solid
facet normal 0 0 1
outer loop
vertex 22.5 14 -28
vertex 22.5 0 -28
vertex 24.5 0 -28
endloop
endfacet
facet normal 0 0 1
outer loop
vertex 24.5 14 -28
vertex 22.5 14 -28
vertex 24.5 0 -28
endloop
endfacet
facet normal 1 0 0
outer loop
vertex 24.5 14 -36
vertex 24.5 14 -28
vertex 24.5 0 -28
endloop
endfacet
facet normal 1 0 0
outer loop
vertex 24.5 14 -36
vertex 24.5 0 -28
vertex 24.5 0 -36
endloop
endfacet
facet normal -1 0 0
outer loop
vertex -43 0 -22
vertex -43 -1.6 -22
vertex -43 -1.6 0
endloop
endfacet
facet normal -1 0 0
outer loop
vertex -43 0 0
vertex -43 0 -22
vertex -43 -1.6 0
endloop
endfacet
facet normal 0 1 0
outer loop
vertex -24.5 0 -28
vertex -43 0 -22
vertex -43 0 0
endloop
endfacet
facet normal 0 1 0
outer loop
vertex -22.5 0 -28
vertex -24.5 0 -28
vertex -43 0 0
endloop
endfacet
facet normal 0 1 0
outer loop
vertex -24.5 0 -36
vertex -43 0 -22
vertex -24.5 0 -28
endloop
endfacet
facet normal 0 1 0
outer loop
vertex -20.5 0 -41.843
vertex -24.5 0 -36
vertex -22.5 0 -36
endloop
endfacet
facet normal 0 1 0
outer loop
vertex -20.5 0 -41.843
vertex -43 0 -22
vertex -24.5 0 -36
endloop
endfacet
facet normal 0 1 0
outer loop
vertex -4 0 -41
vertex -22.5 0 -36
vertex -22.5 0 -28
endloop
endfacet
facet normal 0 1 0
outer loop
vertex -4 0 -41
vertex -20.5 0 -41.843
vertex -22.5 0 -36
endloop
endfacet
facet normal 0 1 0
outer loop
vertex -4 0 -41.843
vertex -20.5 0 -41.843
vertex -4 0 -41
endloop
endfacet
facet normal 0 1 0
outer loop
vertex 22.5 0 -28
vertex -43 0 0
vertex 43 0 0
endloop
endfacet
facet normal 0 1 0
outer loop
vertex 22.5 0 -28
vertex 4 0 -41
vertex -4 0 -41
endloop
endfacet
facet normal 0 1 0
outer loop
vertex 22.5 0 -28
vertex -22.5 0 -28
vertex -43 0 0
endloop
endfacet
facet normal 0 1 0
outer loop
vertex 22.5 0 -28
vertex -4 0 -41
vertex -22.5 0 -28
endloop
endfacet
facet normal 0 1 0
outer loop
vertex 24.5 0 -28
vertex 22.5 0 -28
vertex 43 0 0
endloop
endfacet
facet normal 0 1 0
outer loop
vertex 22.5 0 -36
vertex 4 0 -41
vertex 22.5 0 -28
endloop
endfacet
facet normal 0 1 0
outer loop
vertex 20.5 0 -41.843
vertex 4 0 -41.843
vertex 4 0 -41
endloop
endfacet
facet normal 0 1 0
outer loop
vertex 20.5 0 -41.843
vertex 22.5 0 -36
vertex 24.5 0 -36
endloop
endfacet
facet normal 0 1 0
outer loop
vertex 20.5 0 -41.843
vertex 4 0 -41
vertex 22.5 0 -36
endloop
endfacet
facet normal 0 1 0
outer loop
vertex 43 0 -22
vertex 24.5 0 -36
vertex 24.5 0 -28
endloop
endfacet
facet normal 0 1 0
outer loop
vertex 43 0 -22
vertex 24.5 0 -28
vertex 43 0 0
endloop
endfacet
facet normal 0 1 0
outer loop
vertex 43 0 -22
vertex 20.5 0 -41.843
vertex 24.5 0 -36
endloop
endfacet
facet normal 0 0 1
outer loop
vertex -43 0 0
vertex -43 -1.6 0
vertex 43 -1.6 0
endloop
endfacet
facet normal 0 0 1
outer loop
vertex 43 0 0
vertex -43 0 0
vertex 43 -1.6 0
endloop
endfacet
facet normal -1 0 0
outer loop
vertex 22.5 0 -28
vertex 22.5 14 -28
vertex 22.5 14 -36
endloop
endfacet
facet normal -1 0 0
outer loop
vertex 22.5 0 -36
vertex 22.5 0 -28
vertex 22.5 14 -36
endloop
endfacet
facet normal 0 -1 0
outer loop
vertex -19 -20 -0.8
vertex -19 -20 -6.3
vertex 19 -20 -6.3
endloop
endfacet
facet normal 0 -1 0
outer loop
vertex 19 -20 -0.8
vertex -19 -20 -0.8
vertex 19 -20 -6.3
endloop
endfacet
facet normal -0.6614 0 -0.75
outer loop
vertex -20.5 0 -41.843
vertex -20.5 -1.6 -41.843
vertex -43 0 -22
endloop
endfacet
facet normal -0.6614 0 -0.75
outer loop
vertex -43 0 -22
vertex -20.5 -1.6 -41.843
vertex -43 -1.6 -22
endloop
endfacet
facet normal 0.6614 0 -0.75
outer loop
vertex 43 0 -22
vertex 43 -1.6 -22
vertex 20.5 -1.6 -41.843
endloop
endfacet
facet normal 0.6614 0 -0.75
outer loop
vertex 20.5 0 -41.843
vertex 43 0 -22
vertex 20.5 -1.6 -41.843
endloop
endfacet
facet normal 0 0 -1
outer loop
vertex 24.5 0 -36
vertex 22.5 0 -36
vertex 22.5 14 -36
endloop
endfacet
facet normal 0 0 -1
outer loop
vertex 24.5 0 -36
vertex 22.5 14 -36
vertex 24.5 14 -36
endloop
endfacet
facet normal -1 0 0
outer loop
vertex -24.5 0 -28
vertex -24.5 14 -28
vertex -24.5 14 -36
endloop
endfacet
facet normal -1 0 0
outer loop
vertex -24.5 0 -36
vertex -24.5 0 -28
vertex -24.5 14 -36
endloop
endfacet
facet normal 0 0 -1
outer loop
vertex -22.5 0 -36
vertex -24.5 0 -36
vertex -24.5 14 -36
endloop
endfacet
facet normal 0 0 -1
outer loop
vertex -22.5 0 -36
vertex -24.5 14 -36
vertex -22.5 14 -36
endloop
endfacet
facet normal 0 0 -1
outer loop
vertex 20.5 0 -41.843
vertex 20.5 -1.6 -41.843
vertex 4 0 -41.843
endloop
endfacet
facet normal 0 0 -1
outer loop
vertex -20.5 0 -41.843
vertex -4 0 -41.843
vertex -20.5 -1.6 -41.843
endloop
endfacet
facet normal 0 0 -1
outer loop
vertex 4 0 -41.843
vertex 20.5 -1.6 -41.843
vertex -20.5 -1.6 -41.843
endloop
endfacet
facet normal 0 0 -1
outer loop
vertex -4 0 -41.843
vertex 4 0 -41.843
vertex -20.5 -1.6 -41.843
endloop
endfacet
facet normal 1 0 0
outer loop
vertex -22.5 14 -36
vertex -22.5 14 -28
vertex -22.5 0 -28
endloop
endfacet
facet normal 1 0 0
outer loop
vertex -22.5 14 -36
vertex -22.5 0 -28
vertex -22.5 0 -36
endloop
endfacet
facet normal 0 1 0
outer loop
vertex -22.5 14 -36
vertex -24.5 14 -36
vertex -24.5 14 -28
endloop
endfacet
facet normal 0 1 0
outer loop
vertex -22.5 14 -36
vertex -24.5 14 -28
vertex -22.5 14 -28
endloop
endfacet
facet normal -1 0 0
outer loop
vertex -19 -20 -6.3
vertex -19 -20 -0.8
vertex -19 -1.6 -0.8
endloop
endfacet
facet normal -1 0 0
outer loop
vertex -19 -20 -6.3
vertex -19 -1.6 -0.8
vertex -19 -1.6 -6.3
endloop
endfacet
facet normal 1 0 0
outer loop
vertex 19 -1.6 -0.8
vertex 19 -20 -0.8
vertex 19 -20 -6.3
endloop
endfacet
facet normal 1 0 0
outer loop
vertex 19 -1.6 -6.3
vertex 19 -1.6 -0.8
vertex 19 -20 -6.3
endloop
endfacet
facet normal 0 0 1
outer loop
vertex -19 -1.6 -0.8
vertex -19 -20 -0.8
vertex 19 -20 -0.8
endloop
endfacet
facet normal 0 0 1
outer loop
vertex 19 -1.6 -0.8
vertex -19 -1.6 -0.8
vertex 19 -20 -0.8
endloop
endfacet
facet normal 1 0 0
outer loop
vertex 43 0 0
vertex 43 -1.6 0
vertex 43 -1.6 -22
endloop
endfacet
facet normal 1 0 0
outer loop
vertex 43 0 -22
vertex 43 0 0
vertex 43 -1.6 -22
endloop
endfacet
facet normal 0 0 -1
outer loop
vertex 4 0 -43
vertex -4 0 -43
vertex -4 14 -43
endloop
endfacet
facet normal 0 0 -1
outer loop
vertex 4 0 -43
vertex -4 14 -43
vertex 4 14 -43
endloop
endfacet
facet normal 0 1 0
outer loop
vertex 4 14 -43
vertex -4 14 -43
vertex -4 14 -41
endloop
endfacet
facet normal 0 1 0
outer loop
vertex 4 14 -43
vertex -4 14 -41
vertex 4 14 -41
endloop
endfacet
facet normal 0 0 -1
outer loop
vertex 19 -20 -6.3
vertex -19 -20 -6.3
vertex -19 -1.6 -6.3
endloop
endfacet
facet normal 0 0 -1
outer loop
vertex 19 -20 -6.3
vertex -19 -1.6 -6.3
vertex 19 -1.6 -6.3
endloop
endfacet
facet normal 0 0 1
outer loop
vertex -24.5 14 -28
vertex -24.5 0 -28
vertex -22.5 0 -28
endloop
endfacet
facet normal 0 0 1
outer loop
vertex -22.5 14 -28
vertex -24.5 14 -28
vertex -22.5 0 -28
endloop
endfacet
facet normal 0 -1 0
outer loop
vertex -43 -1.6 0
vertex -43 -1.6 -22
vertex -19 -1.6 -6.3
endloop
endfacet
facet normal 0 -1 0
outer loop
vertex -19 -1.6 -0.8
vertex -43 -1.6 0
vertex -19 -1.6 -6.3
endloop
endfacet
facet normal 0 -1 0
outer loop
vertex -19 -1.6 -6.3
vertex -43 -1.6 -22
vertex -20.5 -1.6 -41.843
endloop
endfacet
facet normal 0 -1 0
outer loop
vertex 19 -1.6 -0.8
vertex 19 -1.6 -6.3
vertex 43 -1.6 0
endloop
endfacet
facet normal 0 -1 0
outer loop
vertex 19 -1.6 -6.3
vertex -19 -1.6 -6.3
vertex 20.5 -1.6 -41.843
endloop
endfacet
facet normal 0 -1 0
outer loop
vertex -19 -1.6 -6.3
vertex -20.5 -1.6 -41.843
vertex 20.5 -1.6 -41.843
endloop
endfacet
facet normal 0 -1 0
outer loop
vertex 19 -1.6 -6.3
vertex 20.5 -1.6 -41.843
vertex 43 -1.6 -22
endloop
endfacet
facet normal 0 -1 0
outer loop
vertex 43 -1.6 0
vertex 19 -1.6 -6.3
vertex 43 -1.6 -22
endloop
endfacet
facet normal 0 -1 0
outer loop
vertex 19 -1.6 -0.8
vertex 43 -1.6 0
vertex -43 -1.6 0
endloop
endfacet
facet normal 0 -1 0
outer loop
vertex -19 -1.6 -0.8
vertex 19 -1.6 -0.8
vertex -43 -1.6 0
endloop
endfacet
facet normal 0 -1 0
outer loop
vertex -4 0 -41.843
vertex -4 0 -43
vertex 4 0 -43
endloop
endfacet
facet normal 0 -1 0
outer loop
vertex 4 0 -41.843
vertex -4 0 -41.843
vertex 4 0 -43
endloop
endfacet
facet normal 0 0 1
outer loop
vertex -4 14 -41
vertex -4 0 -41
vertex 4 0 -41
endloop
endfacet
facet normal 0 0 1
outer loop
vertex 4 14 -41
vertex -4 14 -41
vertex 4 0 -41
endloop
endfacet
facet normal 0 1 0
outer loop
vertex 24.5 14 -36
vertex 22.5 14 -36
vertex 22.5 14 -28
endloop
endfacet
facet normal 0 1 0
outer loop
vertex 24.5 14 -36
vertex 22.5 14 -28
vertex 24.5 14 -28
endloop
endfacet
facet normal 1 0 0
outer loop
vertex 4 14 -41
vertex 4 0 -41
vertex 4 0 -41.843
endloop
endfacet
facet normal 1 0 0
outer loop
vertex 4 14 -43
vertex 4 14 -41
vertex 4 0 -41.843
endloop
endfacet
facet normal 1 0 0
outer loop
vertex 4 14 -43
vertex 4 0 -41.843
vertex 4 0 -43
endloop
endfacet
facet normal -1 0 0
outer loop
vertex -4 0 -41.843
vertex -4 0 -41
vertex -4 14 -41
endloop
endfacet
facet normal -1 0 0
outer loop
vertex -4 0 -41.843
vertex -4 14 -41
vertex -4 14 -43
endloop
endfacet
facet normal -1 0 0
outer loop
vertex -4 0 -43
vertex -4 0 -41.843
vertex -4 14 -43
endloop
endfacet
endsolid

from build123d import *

# Parameters (mm, degrees)
PCB_DEPTH                        = 1.6
SKETCH2_W                        = 38
SKETCH2_H                        = 5.5
J2_HEADER_AND_DUPONT_PLUGS_DEPTH = 20
SKETCH3_W                        = 2
SKETCH3_H                        = 8
TOF_CARRIER_LEFT_DEPTH           = 14
SKETCH4_W                        = 8
SKETCH4_H                        = 2
TOF_CARRIER_AHEAD_DEPTH          = 14
SKETCH5_W                        = 2
SKETCH5_H                        = 8
TOF_CARRIER_RIGHT_DEPTH          = 14


with BuildPart() as part:
    # Sketch1 → PCB (new body)
    with BuildSketch(Plane(origin=(0, -1.6, 0), x_dir=(1, 0, 0), z_dir=(0, 1, 0))):
        Polygon((-43, 0), (43, 0), (43, 22), (20.5, 41.843134833), (-20.5, 41.843134833), (-43, 22), align=None)
    extrude(amount=PCB_DEPTH)

    # Sketch2 → J2 Header And Dupont Plugs (add)
    with BuildSketch(Plane(origin=(0, -20, 0), x_dir=(1, 0, 0), z_dir=(0, 1, 0))):
        with Locations((0, 3.55)):
            Rectangle(SKETCH2_W, SKETCH2_H)
    extrude(amount=J2_HEADER_AND_DUPONT_PLUGS_DEPTH)

    # Sketch3 → ToF Carrier Left (add)
    with BuildSketch(Plane(origin=(0, 0, 0), x_dir=(1, 0, 0), z_dir=(0, 1, 0))):
        with Locations((-23.5, 32)):
            Rectangle(SKETCH3_W, SKETCH3_H)
    extrude(amount=TOF_CARRIER_LEFT_DEPTH)

    # Sketch4 → ToF Carrier Ahead (add)
    with BuildSketch(Plane(origin=(0, 0, 0), x_dir=(1, 0, 0), z_dir=(0, 1, 0))):
        with Locations((0, 42)):
            Rectangle(SKETCH4_W, SKETCH4_H)
    extrude(amount=TOF_CARRIER_AHEAD_DEPTH)

    # Sketch5 → ToF Carrier Right (add)
    with BuildSketch(Plane(origin=(0, 0, 0), x_dir=(1, 0, 0), z_dir=(0, 1, 0))):
        with Locations((23.5, 32)):
            Rectangle(SKETCH5_W, SKETCH5_H)
    extrude(amount=TOF_CARRIER_RIGHT_DEPTH)


solid = part.part
